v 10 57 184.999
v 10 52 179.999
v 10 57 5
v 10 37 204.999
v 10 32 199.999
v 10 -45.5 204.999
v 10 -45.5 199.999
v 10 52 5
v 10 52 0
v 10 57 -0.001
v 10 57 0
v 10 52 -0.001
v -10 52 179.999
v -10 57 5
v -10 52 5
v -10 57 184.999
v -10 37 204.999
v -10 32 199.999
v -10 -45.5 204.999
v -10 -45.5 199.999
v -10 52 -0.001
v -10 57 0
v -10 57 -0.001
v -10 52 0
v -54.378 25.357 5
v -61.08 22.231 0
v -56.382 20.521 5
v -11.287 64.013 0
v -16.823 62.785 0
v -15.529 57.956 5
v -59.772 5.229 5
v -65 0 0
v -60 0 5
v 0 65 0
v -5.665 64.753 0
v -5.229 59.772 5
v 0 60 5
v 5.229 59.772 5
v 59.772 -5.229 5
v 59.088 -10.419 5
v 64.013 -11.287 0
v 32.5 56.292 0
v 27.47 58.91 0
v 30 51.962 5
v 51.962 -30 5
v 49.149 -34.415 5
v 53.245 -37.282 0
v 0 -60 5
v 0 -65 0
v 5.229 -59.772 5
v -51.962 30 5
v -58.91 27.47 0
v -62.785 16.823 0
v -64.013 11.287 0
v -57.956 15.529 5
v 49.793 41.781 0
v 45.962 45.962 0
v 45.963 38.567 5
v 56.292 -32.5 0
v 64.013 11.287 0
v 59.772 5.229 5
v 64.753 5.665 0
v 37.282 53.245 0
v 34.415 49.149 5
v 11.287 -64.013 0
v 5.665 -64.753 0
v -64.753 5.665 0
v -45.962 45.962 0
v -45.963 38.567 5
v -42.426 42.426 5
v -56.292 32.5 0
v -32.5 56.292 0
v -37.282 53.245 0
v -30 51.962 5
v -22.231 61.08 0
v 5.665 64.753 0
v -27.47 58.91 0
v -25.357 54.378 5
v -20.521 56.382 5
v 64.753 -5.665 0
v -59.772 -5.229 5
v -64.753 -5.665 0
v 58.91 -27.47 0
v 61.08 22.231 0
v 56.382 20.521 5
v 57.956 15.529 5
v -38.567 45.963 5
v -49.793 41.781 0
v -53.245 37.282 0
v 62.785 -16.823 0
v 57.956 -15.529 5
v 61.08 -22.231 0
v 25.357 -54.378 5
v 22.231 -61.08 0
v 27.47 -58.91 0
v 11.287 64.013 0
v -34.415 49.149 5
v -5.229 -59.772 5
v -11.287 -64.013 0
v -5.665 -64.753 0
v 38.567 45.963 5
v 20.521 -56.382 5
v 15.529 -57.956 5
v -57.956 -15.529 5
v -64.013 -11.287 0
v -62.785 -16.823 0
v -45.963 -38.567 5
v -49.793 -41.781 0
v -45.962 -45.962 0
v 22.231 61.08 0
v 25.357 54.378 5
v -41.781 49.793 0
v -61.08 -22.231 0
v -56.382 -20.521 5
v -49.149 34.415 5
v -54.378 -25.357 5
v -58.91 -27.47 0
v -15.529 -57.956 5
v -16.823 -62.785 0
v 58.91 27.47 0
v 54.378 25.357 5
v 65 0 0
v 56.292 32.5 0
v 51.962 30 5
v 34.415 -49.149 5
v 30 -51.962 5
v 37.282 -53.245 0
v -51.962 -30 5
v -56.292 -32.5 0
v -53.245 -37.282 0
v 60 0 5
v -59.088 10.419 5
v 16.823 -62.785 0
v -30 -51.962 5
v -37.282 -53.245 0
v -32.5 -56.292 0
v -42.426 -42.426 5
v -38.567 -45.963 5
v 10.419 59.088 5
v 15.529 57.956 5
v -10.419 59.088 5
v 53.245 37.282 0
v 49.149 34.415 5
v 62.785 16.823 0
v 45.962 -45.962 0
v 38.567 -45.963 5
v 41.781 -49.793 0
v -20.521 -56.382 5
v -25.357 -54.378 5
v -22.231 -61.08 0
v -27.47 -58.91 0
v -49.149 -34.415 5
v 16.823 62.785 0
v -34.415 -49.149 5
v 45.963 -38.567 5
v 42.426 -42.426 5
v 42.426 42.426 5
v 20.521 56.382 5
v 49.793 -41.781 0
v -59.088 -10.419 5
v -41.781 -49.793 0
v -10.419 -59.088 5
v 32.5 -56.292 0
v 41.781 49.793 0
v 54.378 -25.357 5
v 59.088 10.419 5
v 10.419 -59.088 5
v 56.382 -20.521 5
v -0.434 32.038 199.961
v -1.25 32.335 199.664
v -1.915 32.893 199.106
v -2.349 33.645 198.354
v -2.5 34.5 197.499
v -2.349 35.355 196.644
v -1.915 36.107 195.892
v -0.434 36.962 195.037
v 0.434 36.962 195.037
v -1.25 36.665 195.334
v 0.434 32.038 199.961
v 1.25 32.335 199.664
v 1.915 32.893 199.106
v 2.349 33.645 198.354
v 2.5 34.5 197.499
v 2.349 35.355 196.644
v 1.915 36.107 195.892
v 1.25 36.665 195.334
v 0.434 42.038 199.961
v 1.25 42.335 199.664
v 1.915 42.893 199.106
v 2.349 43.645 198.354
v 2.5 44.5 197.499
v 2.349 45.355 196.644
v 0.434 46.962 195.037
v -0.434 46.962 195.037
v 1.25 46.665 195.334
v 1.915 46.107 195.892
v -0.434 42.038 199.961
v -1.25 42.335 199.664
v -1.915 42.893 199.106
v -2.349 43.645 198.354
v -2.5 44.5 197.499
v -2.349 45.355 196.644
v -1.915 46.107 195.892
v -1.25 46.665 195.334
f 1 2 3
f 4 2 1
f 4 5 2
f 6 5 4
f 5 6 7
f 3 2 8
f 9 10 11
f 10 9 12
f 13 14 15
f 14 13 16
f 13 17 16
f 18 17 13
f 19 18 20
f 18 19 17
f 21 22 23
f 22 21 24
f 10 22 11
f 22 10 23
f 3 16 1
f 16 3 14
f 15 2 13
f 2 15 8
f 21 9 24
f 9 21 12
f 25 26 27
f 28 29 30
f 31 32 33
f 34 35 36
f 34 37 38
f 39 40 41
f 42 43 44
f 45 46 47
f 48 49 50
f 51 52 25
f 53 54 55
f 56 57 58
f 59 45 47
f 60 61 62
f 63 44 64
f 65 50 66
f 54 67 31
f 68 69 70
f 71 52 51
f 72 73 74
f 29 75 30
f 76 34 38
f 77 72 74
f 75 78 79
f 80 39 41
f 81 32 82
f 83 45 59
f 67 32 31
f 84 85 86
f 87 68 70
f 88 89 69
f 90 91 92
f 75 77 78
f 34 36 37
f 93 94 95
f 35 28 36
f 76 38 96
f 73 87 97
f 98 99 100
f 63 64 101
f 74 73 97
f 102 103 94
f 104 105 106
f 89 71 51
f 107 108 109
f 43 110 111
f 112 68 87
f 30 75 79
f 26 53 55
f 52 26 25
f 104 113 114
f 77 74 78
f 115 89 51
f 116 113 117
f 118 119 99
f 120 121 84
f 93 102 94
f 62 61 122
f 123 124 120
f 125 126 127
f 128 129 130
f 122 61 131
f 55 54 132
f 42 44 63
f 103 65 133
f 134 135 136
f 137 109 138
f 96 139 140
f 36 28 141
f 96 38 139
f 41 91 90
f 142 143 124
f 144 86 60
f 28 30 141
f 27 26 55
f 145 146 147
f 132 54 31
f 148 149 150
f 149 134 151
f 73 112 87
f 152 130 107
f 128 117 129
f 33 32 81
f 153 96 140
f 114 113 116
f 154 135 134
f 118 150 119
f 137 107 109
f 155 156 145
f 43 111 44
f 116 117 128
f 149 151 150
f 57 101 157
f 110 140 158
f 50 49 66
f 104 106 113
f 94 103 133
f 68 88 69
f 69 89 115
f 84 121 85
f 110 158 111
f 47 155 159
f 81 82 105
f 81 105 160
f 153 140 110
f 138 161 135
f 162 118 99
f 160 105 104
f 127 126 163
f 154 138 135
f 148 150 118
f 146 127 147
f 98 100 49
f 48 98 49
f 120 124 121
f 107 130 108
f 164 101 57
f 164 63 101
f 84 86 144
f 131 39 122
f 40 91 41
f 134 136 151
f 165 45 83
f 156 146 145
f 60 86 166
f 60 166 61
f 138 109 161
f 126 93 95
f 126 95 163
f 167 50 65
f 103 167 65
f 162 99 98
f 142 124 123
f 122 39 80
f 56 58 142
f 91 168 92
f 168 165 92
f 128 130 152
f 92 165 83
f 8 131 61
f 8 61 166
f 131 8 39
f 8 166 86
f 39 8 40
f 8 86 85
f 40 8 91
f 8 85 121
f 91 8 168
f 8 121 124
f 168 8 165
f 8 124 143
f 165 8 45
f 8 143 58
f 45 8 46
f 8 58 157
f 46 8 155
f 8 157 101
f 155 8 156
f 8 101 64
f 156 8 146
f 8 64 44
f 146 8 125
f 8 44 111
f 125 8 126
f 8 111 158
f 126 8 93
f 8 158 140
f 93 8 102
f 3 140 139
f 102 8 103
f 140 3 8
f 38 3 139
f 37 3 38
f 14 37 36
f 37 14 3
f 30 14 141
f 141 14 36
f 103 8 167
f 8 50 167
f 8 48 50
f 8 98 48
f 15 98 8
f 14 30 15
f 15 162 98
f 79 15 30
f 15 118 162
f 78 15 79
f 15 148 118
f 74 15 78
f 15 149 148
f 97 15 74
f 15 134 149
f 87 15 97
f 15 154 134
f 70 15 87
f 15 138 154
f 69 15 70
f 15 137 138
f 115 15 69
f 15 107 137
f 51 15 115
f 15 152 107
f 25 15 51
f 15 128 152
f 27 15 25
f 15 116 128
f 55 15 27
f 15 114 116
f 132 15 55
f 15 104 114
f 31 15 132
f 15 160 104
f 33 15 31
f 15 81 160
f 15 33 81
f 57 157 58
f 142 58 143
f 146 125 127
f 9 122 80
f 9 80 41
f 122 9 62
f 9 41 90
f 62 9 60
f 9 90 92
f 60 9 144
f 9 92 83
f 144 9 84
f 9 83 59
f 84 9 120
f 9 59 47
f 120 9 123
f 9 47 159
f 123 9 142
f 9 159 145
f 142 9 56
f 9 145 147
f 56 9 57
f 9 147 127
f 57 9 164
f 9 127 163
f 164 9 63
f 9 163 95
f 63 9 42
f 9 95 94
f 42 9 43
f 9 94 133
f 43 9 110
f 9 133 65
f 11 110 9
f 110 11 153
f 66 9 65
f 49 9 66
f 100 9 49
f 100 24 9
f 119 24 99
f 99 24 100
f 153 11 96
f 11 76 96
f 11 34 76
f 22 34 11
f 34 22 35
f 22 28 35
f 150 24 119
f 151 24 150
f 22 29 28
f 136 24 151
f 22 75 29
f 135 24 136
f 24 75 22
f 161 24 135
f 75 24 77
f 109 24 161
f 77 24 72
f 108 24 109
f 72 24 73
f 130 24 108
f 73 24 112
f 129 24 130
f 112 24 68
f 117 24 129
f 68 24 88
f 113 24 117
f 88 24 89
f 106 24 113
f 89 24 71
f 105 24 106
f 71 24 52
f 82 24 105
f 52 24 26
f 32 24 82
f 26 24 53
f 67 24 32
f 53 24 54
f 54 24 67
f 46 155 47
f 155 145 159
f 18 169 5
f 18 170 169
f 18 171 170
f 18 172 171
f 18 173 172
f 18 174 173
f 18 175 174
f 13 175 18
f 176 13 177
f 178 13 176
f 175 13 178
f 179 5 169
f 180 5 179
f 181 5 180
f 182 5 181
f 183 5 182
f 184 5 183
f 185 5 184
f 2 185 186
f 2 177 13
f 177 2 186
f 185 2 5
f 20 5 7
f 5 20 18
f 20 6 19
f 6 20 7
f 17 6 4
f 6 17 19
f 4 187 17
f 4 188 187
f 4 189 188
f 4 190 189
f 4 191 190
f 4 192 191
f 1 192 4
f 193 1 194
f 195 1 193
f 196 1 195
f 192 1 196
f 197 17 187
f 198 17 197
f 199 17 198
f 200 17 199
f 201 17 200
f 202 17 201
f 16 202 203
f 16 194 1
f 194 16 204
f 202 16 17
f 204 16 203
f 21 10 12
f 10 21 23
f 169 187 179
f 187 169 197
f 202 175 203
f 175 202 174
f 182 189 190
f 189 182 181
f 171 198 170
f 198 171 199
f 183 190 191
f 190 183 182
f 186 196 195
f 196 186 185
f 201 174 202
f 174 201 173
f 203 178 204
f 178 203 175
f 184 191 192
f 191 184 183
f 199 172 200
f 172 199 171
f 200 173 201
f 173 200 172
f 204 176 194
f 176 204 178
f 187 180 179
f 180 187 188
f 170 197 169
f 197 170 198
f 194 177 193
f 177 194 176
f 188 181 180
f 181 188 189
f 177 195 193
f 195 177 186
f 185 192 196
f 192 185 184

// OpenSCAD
/*
 * File: main.scad
 * Copyright (c) 2021 Mihail Korkin <korkin_mv@protonmail.ch>
 * License: MIT
*/

stand_upside_radius = 120/2;
stand_height = 5;

led_length = 75;
led_width = 8;

lamp_thickness = 5;
lamp_height = 200;
lamp_width = led_width * 2.5;
lamp_round_height = 20;
lamp_wire_radius = 5/2;

module kch07pl_lamp() {
    $fn=18;
    t=lamp_thickness;
    x=stand_upside_radius+led_length/2;
    y=lamp_height;
    z=lamp_width;
    rh=lamp_round_height;
    wr=lamp_wire_radius;
    
    difference() {
        linear_extrude(z, center = true) {
            polygon([
                [t, 0],
                [t, y-rh],
                [rh+t, y],
                [x+t, y],
                [x+t, y+t],
                [rh, y+t],
                [0, y-rh+t],
                [0, 0]
            ]);
        }
        
        translate([0,y-wr,0]) rotate([0, 90, 0])
            cylinder(h=x+t, r=wr);
    }
}

module kch07pl_lamp_normal() {
    ur = stand_upside_radius;
    
    translate([0, ur-3, -0.001])
        rotate([90, 0, -90])
            kch07pl_lamp();
}

module kch07pl_stand() {
    $fa=5;
    
    ur = stand_upside_radius;
    h = stand_height;
    
    difference() {
        rotate_extrude() {
            polygon(points = [
                [0, 0],
                [ur+h, 0],
                [ur, h],
                [0, h]
            ]);
        }
        
        kch07pl_lamp_normal();
    }
}

module kch07pl() {
    kch07pl_stand();
    kch07pl_lamp_normal();
}

kch07pl();
